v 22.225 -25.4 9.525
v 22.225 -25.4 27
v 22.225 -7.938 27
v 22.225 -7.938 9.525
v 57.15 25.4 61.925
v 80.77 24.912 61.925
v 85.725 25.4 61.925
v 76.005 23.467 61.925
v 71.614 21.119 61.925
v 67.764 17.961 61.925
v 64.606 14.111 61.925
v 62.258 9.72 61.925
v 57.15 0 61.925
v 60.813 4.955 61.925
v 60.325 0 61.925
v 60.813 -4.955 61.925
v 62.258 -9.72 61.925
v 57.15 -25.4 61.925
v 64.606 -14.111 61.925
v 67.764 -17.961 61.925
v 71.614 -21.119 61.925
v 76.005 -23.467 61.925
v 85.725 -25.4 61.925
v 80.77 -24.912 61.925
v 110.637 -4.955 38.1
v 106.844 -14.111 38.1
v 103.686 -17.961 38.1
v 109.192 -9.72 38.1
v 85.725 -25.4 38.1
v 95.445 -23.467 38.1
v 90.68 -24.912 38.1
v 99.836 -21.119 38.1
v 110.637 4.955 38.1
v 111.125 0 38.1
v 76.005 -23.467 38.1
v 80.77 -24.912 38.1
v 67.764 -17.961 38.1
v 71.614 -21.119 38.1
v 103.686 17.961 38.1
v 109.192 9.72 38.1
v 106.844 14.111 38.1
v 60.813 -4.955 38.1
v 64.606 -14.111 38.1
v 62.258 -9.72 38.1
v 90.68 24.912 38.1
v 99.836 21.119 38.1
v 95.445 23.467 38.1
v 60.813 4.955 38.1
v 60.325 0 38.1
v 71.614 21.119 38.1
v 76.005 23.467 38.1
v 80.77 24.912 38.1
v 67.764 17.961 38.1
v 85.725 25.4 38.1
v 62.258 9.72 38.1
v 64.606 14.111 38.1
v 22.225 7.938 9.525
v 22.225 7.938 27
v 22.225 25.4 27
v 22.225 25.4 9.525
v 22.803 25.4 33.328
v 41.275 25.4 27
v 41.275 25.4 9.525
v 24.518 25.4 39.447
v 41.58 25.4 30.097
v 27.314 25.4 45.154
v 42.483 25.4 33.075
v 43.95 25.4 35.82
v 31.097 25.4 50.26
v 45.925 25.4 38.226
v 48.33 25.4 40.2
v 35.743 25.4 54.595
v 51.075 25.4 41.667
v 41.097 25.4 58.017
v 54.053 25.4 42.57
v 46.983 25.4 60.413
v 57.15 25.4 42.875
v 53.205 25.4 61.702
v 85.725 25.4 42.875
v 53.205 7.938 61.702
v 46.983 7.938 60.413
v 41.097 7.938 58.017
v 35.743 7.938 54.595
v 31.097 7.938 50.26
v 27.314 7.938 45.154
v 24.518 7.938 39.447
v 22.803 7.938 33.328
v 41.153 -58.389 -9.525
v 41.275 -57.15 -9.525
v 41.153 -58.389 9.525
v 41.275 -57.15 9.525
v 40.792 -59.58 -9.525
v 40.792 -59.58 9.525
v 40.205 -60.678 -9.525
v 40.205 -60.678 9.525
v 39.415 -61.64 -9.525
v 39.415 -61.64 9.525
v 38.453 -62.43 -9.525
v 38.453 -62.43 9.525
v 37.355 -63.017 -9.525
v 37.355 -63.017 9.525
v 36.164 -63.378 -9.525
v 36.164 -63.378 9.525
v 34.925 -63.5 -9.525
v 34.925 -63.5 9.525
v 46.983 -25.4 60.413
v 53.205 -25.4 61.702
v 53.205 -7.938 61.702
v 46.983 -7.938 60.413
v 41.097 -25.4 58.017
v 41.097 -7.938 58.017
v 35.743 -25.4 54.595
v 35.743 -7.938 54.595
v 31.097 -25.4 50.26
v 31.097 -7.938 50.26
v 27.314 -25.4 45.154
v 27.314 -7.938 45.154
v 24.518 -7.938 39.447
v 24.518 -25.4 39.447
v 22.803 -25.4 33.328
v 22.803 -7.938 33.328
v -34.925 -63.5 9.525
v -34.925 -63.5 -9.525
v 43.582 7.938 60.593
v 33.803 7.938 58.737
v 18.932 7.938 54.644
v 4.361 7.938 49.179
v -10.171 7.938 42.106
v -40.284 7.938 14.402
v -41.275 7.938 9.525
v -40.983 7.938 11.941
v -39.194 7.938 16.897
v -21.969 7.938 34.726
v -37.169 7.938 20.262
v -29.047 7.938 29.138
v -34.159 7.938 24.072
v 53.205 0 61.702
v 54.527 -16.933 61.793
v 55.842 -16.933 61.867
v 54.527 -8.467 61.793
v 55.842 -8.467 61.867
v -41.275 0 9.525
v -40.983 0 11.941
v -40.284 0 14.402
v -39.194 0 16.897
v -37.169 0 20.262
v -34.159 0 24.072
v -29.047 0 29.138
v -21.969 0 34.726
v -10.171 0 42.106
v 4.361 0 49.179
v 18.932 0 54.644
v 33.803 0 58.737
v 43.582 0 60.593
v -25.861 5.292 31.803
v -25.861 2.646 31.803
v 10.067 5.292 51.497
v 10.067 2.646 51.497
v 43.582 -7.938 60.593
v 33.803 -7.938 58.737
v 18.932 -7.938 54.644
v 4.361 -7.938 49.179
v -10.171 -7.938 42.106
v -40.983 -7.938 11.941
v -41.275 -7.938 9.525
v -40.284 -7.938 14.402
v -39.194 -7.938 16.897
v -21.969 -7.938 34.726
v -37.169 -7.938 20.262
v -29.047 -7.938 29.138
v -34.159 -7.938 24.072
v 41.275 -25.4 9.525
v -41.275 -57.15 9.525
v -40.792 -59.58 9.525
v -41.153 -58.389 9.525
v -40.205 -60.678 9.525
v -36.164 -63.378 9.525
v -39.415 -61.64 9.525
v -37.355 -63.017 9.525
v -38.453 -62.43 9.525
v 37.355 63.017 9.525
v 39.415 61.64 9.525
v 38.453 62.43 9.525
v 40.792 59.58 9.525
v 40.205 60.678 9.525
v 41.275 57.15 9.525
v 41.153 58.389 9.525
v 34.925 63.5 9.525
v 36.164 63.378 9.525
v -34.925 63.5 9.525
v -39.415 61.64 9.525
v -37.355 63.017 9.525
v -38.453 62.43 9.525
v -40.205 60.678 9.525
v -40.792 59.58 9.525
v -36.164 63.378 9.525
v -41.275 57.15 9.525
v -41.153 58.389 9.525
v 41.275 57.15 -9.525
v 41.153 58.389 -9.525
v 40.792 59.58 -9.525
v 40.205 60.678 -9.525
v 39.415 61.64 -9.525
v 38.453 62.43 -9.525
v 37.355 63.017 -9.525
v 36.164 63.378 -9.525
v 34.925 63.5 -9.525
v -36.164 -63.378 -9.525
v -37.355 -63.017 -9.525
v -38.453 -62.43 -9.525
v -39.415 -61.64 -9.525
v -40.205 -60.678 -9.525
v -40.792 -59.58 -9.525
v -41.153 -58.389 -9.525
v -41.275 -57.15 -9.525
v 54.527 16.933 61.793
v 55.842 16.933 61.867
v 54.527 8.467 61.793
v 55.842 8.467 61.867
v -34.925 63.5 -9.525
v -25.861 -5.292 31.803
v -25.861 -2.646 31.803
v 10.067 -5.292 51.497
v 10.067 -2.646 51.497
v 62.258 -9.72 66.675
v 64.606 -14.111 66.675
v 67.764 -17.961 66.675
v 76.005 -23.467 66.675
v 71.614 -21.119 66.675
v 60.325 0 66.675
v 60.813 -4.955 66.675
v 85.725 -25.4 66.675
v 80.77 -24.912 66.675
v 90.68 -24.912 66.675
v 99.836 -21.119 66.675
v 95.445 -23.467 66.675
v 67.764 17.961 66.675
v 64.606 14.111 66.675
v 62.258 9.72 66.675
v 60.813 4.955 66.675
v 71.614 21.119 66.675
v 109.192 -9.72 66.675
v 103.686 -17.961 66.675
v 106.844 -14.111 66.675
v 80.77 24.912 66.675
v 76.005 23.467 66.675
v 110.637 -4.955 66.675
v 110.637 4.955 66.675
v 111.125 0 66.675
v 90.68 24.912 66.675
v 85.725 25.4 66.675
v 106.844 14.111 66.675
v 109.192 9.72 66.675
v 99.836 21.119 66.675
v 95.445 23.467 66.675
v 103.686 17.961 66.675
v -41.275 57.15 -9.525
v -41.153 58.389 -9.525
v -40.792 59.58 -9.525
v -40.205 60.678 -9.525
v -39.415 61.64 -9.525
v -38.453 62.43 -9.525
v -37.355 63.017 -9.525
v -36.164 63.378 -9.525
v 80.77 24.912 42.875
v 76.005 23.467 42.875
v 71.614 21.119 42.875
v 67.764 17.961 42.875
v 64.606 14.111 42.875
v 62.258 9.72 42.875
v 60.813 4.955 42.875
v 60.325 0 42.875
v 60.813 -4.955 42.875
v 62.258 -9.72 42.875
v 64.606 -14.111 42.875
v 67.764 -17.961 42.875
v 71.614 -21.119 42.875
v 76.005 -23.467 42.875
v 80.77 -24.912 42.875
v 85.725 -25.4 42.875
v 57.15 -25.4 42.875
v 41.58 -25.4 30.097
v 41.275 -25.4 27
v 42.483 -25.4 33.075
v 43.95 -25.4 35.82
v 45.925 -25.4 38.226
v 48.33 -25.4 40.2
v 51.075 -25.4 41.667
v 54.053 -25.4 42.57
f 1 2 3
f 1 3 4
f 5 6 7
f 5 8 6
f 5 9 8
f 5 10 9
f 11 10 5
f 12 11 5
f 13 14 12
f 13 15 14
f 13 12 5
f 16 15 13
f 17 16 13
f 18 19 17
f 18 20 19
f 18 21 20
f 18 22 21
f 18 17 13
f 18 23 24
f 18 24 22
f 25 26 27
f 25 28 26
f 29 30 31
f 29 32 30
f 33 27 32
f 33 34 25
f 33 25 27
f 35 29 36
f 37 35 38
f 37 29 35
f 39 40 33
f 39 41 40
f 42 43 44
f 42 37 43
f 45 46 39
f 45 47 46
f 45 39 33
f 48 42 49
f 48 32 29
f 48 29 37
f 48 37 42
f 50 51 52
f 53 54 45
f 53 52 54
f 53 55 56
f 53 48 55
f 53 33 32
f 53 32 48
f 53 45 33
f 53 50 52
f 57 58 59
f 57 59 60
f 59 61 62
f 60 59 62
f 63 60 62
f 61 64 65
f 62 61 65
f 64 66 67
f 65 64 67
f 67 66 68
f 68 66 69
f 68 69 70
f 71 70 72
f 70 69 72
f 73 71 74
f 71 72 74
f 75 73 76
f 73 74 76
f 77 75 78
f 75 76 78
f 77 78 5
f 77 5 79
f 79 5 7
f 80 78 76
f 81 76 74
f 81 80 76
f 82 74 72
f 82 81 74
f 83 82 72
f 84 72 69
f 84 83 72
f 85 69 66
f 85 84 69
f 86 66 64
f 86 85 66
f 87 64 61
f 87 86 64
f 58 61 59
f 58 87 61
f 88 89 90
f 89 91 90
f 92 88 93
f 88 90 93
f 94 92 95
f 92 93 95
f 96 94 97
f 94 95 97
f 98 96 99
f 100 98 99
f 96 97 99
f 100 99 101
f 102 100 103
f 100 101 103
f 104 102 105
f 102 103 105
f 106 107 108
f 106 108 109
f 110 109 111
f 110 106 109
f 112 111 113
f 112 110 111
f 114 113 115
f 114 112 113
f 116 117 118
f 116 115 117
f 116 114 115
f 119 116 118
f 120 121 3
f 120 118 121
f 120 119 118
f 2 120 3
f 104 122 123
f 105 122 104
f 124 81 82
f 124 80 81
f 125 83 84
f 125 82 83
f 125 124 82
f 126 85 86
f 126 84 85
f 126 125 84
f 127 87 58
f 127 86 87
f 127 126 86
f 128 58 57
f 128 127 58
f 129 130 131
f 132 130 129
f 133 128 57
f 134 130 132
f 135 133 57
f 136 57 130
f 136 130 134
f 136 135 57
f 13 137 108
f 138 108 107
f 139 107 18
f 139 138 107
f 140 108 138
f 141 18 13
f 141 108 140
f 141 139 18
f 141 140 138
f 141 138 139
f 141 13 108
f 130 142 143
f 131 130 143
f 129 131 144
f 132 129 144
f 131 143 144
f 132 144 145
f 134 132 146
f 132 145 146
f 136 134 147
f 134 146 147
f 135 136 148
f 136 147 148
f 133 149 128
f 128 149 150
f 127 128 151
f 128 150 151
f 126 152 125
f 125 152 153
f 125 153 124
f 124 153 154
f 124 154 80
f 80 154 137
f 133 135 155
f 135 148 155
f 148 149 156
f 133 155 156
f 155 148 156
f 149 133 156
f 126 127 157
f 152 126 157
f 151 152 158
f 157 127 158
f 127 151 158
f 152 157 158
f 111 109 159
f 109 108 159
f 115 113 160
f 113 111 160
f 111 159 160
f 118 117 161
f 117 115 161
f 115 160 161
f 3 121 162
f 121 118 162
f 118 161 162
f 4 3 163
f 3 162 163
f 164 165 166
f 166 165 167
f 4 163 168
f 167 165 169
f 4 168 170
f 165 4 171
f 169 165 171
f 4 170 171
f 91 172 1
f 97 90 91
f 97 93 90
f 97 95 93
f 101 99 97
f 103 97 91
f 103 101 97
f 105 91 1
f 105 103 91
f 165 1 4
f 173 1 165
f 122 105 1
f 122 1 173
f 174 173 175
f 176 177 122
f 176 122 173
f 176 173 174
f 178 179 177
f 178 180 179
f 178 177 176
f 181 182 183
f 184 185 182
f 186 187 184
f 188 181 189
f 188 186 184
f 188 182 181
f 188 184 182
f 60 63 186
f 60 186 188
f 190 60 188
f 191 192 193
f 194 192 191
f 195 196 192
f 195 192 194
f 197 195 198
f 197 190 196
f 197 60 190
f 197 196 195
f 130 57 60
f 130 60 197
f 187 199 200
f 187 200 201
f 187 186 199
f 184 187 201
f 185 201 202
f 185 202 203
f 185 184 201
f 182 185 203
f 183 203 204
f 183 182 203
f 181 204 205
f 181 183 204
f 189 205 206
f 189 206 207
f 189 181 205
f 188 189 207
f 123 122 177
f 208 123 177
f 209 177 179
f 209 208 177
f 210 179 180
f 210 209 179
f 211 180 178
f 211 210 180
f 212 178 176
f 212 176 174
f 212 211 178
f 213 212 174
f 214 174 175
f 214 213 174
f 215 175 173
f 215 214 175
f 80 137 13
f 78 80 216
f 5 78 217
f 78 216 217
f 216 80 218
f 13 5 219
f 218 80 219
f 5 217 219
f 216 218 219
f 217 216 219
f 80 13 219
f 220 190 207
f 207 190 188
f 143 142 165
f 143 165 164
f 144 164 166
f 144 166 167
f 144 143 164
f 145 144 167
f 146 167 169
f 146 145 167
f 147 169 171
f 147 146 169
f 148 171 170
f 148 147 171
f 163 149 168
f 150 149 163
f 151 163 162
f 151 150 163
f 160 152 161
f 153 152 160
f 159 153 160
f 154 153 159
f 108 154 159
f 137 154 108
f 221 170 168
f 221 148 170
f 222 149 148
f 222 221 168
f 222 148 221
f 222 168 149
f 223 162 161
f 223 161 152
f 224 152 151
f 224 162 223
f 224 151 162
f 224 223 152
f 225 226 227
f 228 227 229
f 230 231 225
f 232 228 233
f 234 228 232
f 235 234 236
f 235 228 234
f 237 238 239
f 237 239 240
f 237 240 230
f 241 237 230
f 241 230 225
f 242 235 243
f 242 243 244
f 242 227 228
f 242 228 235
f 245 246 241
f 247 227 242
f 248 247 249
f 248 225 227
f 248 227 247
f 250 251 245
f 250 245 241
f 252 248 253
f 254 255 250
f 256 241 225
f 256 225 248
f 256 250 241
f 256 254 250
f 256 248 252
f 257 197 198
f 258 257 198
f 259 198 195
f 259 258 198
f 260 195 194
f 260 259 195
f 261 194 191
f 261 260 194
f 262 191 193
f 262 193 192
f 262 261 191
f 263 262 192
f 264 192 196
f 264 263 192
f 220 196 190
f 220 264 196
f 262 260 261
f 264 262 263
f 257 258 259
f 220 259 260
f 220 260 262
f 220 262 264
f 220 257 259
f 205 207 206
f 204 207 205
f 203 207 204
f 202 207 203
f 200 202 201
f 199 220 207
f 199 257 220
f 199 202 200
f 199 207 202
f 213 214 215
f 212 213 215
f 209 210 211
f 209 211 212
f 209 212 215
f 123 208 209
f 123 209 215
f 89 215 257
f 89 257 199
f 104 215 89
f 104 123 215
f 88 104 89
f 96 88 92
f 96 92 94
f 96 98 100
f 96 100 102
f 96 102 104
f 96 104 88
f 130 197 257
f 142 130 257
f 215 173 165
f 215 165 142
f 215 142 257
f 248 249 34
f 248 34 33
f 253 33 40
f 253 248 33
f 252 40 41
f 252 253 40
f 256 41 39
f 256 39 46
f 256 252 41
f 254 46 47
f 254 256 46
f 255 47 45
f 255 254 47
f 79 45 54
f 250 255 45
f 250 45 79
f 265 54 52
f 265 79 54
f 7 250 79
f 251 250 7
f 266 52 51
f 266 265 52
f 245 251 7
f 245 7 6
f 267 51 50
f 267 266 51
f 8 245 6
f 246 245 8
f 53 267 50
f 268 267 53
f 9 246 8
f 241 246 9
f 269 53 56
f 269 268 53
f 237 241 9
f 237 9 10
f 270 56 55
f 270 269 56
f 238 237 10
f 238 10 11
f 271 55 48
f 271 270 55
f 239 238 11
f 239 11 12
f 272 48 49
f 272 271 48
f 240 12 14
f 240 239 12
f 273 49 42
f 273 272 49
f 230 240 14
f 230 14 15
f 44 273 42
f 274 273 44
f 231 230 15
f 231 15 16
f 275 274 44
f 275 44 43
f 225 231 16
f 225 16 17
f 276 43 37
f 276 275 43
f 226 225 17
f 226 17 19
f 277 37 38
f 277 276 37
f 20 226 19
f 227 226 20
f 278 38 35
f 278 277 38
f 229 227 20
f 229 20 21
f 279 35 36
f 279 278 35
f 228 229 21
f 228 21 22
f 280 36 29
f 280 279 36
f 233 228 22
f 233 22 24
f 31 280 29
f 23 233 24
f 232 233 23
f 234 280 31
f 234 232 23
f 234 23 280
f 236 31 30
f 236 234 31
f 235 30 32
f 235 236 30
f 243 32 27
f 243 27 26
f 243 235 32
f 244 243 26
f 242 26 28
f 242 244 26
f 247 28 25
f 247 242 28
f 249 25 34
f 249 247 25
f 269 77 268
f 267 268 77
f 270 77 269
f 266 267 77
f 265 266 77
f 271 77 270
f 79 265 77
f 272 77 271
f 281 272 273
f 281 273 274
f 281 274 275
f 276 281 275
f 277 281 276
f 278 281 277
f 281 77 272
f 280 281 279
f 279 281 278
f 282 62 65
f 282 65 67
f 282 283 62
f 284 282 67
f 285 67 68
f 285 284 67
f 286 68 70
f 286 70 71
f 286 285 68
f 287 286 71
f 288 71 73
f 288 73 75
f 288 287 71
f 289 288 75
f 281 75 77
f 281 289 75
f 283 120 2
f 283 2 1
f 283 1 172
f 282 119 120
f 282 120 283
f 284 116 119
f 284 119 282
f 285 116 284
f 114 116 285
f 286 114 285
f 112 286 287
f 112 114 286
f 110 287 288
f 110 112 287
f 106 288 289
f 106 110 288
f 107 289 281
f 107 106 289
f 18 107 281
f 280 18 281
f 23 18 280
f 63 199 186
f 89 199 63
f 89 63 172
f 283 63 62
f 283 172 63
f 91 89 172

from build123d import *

# Parameters (mm, degrees)
F1_DEPTH = 63.5
F2_DEPTH = 7.9375
F0_W     = 25.4
F0_H     = 19.05
F3_DEPTH = 25.4
F5_R     = 6.35


with BuildPart() as f1:
    # F0 (on Front) → F1 (new body, symmetric)
    with BuildSketch(Plane.XZ):
        Polygon((-41.275, 9.525), (-41.275, -9.525), (41.275, -9.525), (41.275, 9.525), (22.225, 9.525), align=None)
    extrude(amount=F1_DEPTH, both=True)

    # F0 (on Front) → F2 (join, symmetric)
    with BuildSketch(Plane.XZ):
        with BuildLine():
            add(Edge.make_bspline(
                [(-41.275, 9.525), (-40.5524685808, 30.7933831183), (10.8961521527, 58.542204844), (53.2054273143, 61.7017269308)],
                knots=[0, 0, 0, 0, 108.12000921, 108.12000921, 108.12000921, 108.12000921], degree=3))
            Line((-41.275, 9.525), (22.225, 9.525))
            Line((22.225, 9.525), (22.225, 27.0002))
            ThreePointArc((22.225, 27.0002), (31.096978812, 50.2595145208), (53.2054273143, 61.7017269308))
        make_face()
    extrude(amount=F2_DEPTH, both=True)

    # F0 (on Front) → F3 (join, symmetric)
    with BuildSketch(Plane.XZ):
        with Locations((73.025, 52.4002)):
            Rectangle(F0_W, F0_H)
        with BuildLine():
            Line((22.225, 9.525), (41.275, 9.525))
            Line((41.275, 9.525), (41.275, 27.0002))
            ThreePointArc((41.275, 27.0002), (45.9246798487, 38.2255201513), (57.15, 42.8752))
            Line((57.15, 42.8752), (60.325, 42.8752))
            Line((60.325, 42.8752), (60.325, 61.9252))
            Line((60.325, 61.9252), (57.15, 61.9252))
            add(Edge.make_bspline(
                [(53.2054273143, 61.7017269308), (54.5298526747, 61.8006308038), (55.8453223482, 61.8754395085), (57.15, 61.9252)],
                knots=[108.12000921, 108.12000921, 108.12000921, 108.12000921, 111.5045361635, 111.5045361635, 111.5045361635, 111.5045361635], degree=3))
            ThreePointArc((53.2054273143, 61.7017269308), (31.096978812, 50.2595145208), (22.225, 27.0002))
            Line((22.225, 27.0002), (22.225, 9.525))
        make_face()
    extrude(amount=F3_DEPTH, both=True)

    # F0 (on Front) → F4 (revolve)
    with BuildSketch(Plane.XZ):
        Polygon((85.725, 66.675), (85.725, 61.9252), (85.725, 42.8752), (85.725, 38.1), (111.125, 38.1), (111.125, 66.675), align=None)
    revolve(axis=Axis((85.725, 0, 52.3875), (0, 0, 1)))

    # F5
    f5_edges = [f1.edges().sort_by_distance(p)[0] for p in [
        (41.275, -63.5, 0),
        (-41.275, -63.5, 0),
        (41.275, 63.5, 0),
        (-41.275, 63.5, 0),
    ]]
    fillet(f5_edges, radius=F5_R)


solid = f1.part
